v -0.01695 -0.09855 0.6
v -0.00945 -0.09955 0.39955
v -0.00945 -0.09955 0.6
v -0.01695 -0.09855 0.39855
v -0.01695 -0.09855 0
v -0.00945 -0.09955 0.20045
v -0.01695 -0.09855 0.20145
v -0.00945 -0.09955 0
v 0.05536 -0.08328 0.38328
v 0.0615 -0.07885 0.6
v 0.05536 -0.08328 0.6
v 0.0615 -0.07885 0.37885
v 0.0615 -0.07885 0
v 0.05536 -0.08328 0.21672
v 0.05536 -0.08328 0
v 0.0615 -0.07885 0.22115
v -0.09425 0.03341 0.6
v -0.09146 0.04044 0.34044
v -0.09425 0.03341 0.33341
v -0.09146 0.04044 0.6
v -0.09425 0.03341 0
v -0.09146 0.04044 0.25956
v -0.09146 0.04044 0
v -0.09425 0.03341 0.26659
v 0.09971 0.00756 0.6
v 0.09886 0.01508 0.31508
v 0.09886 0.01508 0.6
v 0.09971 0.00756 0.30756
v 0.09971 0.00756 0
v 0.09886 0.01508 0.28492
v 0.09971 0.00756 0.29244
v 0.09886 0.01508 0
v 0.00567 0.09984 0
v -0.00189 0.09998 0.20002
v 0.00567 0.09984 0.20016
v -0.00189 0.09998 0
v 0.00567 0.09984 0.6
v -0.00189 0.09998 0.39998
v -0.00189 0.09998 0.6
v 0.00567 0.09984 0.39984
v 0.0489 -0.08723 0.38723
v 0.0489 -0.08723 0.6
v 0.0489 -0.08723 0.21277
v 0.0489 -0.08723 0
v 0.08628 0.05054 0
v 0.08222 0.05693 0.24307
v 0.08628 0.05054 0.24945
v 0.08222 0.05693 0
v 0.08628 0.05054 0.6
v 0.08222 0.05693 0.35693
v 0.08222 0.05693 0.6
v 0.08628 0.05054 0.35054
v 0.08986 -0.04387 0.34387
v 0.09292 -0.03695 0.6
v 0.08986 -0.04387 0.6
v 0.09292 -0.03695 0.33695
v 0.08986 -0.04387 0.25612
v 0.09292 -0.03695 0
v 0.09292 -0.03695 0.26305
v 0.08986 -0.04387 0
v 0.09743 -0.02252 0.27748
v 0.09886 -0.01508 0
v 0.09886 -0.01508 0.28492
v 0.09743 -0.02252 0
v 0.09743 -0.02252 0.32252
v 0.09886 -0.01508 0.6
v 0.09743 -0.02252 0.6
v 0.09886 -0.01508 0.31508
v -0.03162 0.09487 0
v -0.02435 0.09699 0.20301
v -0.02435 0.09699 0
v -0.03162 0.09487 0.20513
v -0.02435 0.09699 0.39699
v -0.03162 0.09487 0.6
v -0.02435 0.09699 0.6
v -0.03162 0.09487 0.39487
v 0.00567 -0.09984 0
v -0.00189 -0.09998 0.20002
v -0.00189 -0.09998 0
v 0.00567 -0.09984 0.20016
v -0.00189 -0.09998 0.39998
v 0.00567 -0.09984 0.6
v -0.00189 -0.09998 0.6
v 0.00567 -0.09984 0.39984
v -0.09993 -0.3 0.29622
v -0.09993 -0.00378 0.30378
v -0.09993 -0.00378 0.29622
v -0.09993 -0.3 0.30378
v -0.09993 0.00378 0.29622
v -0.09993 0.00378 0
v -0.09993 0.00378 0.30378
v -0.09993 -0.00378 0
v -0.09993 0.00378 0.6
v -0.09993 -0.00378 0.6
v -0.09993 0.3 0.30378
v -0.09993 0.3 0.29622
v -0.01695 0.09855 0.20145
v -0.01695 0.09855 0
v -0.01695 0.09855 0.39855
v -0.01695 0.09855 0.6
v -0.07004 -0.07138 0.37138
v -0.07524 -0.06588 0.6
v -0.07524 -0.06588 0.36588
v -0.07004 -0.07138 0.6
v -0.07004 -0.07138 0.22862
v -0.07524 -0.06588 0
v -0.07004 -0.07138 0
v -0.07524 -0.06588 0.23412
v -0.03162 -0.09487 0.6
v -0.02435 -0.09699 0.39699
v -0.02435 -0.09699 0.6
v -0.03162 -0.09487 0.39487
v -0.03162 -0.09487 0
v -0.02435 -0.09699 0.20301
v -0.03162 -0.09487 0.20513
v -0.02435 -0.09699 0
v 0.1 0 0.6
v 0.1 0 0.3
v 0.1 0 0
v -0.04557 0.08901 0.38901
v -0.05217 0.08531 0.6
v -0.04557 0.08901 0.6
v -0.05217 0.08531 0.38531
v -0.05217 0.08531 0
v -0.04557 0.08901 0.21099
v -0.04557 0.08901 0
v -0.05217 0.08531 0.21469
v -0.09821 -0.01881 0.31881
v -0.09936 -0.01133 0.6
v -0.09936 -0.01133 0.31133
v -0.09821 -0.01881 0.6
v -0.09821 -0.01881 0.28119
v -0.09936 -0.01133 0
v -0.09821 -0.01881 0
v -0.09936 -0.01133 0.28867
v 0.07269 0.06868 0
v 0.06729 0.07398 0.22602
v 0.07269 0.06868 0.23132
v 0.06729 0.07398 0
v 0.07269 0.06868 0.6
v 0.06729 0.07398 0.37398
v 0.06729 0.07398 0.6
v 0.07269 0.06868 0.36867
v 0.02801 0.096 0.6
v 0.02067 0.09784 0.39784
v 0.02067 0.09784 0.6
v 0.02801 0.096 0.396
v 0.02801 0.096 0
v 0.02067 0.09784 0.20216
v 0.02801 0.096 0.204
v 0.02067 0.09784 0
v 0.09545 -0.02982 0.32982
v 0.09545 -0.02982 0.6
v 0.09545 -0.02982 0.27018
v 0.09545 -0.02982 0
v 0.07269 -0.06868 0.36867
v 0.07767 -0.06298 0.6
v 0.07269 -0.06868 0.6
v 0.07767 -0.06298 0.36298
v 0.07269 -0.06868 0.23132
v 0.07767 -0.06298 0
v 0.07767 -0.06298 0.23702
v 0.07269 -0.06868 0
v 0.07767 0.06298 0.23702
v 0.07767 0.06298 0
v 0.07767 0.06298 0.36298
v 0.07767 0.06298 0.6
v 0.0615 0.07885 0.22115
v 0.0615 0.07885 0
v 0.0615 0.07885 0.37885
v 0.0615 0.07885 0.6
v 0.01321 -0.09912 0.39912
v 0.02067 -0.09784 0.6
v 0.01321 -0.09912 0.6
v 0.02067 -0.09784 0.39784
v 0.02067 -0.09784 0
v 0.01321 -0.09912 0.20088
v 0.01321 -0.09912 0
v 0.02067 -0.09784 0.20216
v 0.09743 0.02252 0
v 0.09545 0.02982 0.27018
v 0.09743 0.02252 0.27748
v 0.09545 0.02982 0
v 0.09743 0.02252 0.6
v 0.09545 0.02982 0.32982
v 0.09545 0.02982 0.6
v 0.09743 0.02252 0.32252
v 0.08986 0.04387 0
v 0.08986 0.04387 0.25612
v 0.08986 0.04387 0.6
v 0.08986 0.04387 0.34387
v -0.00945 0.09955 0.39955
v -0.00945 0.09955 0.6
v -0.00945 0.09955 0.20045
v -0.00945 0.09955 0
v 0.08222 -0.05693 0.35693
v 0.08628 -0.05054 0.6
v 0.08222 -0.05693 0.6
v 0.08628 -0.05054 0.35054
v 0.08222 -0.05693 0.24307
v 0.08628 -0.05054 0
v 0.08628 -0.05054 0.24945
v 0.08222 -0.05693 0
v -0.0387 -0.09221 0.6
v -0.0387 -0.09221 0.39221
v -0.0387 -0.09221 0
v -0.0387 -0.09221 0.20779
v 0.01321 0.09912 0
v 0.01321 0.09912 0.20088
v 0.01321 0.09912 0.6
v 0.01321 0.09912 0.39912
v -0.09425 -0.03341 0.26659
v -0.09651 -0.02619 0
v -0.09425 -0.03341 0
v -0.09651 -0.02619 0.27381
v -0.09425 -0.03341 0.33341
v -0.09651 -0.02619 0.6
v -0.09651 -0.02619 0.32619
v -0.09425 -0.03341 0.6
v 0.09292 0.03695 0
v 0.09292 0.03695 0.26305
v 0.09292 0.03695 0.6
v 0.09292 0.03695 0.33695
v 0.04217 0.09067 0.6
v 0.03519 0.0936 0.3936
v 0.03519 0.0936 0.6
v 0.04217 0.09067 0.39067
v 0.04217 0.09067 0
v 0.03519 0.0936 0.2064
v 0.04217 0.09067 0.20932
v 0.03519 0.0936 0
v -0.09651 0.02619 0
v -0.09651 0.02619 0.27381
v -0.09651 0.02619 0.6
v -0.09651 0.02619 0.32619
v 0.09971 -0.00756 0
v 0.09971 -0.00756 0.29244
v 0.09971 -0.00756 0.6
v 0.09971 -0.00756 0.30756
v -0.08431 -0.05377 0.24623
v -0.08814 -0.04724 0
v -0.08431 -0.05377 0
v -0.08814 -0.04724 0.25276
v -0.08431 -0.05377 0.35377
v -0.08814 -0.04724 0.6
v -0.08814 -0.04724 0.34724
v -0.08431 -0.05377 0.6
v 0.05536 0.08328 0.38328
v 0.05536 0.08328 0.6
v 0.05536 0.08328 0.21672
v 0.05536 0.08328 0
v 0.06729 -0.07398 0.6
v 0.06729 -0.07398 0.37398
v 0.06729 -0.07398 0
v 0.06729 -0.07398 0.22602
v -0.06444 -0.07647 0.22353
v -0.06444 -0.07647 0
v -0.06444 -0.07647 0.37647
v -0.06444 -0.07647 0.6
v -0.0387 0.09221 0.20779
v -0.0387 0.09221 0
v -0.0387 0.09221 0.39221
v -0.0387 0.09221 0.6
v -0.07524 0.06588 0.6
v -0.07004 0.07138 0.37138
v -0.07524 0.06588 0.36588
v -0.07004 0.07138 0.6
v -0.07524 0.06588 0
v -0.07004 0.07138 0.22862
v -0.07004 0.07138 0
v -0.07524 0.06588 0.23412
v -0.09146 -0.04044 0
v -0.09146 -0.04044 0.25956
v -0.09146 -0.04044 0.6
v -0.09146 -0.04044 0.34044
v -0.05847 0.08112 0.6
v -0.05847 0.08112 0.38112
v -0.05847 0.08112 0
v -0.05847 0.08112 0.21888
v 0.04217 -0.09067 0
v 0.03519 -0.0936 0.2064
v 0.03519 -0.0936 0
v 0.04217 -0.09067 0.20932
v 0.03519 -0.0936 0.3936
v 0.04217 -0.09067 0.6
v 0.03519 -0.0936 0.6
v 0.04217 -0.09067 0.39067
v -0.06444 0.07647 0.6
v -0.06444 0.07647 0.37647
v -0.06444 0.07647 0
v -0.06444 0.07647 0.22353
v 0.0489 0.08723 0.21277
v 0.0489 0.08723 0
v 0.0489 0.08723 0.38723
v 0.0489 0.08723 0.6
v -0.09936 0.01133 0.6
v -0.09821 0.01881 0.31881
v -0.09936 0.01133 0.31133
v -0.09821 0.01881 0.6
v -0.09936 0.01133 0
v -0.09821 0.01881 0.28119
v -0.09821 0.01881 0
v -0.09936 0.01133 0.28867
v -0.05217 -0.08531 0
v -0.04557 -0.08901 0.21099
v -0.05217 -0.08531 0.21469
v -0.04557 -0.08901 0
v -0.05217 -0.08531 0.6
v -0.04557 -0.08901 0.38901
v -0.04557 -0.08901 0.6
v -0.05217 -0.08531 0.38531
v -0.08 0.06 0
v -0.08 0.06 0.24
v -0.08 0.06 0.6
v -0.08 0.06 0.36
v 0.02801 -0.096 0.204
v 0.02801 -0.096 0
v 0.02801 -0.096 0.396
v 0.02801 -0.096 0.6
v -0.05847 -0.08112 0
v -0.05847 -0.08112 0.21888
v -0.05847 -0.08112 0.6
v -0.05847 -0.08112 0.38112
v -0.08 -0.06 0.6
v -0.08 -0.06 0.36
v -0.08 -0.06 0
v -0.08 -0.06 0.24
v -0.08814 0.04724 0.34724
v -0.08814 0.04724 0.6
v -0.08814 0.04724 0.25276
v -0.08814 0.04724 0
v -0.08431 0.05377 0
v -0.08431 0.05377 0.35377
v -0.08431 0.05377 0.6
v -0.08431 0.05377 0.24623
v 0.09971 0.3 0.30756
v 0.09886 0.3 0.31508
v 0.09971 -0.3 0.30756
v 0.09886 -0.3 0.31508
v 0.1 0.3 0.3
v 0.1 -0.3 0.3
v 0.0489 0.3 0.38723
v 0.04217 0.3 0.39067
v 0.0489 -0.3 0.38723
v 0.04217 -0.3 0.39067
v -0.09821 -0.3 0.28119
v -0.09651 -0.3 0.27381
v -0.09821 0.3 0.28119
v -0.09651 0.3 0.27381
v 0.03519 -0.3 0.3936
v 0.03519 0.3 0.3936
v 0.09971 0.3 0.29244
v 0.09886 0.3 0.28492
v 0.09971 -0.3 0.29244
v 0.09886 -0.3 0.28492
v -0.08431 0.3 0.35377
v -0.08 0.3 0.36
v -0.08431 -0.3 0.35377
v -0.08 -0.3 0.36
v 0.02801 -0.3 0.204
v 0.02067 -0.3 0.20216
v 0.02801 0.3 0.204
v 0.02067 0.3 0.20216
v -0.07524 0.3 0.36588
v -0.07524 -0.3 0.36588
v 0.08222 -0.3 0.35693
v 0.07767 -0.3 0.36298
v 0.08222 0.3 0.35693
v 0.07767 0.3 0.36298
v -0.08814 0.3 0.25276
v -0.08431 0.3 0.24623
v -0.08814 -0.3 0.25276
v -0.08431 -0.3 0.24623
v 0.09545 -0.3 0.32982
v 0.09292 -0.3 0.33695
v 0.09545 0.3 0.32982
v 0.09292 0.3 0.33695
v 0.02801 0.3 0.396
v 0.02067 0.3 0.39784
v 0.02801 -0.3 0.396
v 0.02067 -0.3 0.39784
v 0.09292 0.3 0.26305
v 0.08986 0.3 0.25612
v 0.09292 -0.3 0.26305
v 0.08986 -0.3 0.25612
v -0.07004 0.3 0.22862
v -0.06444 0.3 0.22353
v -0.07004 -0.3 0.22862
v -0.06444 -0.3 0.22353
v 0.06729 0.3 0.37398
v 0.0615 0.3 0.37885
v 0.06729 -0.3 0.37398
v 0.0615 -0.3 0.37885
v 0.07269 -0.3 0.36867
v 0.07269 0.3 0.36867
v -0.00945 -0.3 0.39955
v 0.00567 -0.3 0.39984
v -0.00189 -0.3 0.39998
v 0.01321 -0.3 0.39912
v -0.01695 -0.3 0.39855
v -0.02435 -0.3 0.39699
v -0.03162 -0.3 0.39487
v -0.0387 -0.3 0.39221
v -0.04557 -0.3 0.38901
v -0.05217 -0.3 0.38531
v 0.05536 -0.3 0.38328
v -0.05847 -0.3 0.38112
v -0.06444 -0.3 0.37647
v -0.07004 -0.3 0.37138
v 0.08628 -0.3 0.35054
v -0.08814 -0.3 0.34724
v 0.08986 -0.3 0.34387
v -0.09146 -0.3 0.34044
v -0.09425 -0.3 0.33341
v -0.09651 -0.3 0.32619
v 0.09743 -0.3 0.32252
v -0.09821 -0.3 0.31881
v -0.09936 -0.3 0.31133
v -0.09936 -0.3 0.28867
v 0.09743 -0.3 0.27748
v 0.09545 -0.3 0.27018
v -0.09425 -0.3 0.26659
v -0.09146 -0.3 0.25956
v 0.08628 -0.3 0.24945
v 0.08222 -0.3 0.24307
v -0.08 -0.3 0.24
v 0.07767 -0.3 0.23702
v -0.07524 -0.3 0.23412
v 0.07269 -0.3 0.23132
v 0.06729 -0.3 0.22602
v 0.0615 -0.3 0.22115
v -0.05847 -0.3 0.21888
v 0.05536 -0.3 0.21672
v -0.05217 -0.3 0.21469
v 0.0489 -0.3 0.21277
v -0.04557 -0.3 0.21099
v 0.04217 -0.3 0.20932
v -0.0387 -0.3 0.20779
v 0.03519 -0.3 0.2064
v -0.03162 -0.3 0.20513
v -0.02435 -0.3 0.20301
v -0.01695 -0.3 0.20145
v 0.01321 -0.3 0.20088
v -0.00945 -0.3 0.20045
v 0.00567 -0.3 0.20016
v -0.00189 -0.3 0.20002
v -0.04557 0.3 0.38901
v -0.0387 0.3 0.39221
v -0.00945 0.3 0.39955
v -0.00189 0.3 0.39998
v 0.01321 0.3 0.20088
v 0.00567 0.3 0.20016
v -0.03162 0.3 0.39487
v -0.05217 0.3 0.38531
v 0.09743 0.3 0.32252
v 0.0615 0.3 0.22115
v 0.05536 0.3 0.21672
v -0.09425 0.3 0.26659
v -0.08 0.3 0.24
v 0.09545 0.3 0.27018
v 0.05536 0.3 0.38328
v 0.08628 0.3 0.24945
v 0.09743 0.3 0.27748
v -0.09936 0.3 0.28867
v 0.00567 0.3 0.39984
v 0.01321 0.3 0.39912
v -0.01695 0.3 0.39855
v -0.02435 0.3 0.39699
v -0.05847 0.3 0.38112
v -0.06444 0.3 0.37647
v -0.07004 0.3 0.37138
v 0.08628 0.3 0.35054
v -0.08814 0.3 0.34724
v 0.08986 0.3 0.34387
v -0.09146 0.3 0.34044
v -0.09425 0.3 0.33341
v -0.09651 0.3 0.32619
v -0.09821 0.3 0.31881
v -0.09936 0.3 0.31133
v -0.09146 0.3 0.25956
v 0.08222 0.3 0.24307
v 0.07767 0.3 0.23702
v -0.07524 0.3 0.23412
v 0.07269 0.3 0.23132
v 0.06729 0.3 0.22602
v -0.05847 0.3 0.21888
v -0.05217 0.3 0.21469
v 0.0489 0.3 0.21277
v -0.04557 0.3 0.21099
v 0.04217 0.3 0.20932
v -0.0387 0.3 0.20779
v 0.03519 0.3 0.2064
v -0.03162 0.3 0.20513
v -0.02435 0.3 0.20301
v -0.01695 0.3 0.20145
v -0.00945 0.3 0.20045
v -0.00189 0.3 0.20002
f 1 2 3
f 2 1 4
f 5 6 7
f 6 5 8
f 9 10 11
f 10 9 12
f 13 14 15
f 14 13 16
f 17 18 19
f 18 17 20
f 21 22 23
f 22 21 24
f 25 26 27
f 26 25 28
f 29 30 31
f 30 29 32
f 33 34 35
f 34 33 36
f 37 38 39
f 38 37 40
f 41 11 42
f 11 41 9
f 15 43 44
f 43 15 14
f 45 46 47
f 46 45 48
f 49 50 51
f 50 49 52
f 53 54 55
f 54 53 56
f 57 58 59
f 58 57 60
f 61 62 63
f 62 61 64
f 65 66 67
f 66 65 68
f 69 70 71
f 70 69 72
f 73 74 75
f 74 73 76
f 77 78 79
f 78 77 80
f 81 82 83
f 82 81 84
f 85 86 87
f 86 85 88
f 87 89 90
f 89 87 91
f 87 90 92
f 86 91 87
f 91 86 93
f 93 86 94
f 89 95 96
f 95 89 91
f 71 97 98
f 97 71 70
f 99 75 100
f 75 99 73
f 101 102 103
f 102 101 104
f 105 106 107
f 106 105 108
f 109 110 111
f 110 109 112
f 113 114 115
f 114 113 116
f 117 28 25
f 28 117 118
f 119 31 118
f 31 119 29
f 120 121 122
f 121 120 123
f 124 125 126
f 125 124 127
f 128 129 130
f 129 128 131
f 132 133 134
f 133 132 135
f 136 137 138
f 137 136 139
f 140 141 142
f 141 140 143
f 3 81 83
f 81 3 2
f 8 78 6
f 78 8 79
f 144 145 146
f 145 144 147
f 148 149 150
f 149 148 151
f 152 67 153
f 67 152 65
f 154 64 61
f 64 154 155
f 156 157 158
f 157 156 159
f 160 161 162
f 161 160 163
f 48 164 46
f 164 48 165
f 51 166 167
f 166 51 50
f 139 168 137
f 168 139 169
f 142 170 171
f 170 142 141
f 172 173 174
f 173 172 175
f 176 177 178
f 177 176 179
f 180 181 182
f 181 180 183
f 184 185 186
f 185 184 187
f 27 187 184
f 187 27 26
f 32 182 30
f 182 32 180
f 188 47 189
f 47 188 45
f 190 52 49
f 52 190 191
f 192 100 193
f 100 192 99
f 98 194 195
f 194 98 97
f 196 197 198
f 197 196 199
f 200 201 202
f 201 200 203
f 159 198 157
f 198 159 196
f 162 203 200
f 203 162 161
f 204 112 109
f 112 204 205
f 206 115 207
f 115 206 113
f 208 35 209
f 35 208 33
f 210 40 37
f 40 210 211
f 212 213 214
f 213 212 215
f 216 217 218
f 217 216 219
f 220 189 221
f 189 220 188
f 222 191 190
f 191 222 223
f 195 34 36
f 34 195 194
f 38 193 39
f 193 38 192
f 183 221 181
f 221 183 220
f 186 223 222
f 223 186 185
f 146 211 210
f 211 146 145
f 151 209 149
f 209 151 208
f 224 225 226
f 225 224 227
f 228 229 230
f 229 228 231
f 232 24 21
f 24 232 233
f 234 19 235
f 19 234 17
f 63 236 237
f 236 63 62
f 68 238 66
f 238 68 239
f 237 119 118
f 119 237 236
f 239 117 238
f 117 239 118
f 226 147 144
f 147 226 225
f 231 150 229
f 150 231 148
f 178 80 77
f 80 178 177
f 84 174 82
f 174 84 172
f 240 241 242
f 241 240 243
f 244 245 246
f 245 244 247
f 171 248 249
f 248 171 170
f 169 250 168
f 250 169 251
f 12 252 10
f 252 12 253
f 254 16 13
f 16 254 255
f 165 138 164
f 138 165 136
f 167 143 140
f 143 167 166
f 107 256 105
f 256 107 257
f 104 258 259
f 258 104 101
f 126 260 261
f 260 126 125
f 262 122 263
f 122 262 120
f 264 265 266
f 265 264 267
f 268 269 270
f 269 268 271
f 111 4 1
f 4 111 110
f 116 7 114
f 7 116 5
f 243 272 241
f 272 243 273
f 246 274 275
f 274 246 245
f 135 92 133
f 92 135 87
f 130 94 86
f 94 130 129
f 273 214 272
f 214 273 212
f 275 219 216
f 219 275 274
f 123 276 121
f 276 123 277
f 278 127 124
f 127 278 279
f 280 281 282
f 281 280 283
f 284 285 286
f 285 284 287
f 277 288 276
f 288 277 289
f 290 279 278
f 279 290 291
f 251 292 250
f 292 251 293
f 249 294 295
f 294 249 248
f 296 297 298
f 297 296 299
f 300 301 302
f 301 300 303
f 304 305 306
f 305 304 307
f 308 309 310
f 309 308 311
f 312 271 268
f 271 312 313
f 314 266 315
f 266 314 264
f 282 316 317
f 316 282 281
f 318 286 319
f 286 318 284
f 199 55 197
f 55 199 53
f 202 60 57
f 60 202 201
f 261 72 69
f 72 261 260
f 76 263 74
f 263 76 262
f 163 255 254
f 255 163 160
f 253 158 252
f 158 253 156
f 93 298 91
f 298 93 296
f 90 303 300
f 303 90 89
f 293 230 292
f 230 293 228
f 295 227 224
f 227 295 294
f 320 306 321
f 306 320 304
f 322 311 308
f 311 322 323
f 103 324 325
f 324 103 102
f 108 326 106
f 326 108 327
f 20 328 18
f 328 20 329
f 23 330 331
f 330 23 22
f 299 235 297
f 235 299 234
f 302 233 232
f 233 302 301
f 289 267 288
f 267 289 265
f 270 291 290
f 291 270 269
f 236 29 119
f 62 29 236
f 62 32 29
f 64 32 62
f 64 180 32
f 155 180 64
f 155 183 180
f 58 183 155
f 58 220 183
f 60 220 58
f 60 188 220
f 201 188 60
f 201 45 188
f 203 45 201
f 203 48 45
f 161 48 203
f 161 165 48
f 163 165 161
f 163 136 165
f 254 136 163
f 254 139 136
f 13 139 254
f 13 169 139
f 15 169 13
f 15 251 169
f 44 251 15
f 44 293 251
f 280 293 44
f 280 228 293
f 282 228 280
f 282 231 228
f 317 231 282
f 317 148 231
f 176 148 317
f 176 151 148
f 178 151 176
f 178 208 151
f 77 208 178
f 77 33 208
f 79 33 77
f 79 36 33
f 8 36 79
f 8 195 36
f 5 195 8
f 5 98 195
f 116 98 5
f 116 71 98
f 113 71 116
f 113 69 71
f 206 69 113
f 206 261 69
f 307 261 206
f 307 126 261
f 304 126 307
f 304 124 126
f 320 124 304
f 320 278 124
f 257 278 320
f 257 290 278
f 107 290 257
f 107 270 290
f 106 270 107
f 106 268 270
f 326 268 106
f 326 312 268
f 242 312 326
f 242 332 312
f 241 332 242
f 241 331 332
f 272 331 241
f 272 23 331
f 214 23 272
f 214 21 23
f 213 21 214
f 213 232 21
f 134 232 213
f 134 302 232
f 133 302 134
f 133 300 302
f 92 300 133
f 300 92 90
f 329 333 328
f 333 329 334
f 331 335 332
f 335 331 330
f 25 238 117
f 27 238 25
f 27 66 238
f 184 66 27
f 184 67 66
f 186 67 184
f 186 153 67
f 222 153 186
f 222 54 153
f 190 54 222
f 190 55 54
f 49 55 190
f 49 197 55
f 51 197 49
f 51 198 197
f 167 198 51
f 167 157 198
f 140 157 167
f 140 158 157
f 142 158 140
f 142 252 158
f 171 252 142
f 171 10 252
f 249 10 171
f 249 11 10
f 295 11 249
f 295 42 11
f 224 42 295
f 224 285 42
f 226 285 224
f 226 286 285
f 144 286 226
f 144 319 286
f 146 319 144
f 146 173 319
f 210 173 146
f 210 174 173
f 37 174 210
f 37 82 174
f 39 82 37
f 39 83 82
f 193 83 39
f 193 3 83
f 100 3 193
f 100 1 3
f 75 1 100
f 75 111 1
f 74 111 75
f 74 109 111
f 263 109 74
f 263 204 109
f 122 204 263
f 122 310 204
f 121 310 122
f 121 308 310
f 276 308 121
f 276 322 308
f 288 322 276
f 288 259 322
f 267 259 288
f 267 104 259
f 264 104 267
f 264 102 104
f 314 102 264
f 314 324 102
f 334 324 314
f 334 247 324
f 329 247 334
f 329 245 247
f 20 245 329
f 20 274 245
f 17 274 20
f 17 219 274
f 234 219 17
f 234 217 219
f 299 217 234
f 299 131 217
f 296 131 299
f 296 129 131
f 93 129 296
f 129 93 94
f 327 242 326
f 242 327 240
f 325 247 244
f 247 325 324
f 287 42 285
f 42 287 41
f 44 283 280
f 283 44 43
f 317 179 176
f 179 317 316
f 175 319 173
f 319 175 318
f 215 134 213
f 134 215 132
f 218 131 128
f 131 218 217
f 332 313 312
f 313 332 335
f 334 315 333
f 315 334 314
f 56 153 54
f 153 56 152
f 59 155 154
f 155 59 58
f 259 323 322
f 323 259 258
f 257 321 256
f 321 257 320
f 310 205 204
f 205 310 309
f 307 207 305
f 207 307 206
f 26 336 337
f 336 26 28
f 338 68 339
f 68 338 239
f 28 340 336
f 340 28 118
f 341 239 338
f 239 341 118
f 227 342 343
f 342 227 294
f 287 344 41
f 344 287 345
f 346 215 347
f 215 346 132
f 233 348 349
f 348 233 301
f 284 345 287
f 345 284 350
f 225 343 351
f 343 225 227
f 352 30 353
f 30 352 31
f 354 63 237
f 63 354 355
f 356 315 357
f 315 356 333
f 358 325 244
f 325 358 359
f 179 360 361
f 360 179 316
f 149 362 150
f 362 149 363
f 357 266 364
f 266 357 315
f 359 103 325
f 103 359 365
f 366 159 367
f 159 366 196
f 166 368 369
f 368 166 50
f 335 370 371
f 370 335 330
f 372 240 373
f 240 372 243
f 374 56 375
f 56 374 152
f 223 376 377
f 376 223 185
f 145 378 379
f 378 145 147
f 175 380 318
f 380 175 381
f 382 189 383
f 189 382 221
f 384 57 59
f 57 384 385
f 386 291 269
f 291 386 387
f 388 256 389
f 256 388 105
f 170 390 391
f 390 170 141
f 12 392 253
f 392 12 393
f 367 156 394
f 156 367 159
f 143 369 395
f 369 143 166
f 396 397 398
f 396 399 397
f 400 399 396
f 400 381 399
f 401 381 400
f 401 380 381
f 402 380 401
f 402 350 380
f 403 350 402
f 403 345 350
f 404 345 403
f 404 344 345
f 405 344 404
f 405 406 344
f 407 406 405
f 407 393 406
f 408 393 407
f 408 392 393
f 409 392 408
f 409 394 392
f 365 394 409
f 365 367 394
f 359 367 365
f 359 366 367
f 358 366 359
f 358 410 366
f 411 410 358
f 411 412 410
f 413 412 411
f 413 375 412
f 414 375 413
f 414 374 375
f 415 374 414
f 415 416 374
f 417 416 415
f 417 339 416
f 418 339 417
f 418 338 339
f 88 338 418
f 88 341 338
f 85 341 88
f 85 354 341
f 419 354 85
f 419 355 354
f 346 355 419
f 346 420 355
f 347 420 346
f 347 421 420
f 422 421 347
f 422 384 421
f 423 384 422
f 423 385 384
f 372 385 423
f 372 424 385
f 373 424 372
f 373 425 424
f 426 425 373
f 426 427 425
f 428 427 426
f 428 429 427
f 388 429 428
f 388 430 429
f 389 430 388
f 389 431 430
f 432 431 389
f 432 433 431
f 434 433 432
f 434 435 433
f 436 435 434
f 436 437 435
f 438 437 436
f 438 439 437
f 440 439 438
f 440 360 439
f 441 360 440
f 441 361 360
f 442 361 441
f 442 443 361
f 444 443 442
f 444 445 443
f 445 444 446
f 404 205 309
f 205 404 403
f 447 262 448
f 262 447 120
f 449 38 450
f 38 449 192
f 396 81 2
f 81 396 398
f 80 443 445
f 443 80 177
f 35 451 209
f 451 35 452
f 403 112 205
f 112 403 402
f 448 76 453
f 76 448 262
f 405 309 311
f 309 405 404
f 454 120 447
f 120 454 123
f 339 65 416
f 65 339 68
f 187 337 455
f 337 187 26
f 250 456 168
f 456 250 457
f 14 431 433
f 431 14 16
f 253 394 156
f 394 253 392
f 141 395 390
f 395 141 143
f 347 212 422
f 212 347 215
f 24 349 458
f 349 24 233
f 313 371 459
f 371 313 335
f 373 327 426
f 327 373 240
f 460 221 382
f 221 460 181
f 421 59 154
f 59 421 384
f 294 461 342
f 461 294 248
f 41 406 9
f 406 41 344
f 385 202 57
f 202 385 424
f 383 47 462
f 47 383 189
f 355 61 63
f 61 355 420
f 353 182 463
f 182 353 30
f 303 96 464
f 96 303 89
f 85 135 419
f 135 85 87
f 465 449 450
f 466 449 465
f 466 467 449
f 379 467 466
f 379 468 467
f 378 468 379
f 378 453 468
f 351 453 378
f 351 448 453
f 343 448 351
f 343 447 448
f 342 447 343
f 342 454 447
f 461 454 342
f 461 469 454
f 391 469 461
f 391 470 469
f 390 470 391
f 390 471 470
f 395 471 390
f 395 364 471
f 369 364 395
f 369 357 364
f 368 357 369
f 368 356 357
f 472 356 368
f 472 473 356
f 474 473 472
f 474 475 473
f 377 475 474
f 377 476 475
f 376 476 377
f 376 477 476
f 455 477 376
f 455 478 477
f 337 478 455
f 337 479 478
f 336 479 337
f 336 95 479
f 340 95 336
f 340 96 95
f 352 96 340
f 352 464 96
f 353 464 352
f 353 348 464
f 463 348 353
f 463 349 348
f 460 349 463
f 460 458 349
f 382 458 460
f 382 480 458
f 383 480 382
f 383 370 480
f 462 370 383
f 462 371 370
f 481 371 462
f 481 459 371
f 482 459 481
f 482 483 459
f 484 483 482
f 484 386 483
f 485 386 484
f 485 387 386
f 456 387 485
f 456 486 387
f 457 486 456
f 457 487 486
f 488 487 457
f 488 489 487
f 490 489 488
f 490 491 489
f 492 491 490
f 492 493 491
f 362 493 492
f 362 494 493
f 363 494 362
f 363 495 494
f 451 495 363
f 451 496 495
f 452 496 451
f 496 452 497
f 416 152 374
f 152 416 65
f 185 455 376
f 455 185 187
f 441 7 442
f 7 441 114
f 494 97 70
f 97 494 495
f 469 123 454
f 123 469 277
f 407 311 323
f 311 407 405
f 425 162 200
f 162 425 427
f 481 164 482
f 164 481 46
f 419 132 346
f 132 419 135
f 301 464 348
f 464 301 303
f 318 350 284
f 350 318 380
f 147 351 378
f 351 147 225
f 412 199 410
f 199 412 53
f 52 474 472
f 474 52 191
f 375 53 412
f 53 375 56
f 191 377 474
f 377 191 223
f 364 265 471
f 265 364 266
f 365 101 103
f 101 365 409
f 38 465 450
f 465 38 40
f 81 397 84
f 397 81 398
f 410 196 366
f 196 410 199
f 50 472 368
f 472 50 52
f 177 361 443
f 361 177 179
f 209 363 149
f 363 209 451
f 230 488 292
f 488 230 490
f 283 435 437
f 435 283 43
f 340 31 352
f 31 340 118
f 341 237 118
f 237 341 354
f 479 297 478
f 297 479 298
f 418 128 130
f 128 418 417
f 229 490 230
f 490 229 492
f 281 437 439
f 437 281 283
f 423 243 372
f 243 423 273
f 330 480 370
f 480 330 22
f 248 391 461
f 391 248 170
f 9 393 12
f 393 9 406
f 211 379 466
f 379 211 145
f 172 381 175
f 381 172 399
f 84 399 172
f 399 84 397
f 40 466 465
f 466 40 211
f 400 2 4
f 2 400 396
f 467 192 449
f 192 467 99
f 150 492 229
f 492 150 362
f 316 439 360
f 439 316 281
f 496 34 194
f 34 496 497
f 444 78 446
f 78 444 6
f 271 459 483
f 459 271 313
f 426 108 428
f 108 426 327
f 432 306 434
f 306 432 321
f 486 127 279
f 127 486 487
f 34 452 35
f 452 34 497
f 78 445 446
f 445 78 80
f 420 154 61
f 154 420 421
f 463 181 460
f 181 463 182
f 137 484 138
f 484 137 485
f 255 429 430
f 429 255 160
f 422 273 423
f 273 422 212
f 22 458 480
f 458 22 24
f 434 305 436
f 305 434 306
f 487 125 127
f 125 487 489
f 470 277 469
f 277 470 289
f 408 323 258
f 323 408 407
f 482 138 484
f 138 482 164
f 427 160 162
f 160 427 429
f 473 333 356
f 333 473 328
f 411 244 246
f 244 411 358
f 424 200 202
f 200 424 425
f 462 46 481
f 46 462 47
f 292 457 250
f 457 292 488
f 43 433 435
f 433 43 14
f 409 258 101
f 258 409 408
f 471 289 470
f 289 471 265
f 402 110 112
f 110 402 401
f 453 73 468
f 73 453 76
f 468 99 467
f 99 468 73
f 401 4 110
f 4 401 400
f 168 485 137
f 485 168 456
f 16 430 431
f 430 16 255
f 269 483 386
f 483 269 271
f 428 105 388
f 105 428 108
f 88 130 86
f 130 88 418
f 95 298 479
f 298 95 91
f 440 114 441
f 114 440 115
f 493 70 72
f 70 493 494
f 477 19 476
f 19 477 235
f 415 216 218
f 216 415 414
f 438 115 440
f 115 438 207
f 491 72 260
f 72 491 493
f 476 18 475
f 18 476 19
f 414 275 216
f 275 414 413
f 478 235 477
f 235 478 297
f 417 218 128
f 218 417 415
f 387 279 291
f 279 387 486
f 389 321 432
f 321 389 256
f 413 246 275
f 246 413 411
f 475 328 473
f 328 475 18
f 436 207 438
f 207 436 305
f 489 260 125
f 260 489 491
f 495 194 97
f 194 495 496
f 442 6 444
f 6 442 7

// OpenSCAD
$fn = 83;
$R=0.1;

union()
{

cylinder(h=0.6, r1=$R, r2=$R,center=false);


translate([0.0, 0.3, 0.3])
{
    rotate([90, 0, 0])
    {
    cylinder(h=0.6, r1=$R, r2=$R,center=false);
    }
}
}
